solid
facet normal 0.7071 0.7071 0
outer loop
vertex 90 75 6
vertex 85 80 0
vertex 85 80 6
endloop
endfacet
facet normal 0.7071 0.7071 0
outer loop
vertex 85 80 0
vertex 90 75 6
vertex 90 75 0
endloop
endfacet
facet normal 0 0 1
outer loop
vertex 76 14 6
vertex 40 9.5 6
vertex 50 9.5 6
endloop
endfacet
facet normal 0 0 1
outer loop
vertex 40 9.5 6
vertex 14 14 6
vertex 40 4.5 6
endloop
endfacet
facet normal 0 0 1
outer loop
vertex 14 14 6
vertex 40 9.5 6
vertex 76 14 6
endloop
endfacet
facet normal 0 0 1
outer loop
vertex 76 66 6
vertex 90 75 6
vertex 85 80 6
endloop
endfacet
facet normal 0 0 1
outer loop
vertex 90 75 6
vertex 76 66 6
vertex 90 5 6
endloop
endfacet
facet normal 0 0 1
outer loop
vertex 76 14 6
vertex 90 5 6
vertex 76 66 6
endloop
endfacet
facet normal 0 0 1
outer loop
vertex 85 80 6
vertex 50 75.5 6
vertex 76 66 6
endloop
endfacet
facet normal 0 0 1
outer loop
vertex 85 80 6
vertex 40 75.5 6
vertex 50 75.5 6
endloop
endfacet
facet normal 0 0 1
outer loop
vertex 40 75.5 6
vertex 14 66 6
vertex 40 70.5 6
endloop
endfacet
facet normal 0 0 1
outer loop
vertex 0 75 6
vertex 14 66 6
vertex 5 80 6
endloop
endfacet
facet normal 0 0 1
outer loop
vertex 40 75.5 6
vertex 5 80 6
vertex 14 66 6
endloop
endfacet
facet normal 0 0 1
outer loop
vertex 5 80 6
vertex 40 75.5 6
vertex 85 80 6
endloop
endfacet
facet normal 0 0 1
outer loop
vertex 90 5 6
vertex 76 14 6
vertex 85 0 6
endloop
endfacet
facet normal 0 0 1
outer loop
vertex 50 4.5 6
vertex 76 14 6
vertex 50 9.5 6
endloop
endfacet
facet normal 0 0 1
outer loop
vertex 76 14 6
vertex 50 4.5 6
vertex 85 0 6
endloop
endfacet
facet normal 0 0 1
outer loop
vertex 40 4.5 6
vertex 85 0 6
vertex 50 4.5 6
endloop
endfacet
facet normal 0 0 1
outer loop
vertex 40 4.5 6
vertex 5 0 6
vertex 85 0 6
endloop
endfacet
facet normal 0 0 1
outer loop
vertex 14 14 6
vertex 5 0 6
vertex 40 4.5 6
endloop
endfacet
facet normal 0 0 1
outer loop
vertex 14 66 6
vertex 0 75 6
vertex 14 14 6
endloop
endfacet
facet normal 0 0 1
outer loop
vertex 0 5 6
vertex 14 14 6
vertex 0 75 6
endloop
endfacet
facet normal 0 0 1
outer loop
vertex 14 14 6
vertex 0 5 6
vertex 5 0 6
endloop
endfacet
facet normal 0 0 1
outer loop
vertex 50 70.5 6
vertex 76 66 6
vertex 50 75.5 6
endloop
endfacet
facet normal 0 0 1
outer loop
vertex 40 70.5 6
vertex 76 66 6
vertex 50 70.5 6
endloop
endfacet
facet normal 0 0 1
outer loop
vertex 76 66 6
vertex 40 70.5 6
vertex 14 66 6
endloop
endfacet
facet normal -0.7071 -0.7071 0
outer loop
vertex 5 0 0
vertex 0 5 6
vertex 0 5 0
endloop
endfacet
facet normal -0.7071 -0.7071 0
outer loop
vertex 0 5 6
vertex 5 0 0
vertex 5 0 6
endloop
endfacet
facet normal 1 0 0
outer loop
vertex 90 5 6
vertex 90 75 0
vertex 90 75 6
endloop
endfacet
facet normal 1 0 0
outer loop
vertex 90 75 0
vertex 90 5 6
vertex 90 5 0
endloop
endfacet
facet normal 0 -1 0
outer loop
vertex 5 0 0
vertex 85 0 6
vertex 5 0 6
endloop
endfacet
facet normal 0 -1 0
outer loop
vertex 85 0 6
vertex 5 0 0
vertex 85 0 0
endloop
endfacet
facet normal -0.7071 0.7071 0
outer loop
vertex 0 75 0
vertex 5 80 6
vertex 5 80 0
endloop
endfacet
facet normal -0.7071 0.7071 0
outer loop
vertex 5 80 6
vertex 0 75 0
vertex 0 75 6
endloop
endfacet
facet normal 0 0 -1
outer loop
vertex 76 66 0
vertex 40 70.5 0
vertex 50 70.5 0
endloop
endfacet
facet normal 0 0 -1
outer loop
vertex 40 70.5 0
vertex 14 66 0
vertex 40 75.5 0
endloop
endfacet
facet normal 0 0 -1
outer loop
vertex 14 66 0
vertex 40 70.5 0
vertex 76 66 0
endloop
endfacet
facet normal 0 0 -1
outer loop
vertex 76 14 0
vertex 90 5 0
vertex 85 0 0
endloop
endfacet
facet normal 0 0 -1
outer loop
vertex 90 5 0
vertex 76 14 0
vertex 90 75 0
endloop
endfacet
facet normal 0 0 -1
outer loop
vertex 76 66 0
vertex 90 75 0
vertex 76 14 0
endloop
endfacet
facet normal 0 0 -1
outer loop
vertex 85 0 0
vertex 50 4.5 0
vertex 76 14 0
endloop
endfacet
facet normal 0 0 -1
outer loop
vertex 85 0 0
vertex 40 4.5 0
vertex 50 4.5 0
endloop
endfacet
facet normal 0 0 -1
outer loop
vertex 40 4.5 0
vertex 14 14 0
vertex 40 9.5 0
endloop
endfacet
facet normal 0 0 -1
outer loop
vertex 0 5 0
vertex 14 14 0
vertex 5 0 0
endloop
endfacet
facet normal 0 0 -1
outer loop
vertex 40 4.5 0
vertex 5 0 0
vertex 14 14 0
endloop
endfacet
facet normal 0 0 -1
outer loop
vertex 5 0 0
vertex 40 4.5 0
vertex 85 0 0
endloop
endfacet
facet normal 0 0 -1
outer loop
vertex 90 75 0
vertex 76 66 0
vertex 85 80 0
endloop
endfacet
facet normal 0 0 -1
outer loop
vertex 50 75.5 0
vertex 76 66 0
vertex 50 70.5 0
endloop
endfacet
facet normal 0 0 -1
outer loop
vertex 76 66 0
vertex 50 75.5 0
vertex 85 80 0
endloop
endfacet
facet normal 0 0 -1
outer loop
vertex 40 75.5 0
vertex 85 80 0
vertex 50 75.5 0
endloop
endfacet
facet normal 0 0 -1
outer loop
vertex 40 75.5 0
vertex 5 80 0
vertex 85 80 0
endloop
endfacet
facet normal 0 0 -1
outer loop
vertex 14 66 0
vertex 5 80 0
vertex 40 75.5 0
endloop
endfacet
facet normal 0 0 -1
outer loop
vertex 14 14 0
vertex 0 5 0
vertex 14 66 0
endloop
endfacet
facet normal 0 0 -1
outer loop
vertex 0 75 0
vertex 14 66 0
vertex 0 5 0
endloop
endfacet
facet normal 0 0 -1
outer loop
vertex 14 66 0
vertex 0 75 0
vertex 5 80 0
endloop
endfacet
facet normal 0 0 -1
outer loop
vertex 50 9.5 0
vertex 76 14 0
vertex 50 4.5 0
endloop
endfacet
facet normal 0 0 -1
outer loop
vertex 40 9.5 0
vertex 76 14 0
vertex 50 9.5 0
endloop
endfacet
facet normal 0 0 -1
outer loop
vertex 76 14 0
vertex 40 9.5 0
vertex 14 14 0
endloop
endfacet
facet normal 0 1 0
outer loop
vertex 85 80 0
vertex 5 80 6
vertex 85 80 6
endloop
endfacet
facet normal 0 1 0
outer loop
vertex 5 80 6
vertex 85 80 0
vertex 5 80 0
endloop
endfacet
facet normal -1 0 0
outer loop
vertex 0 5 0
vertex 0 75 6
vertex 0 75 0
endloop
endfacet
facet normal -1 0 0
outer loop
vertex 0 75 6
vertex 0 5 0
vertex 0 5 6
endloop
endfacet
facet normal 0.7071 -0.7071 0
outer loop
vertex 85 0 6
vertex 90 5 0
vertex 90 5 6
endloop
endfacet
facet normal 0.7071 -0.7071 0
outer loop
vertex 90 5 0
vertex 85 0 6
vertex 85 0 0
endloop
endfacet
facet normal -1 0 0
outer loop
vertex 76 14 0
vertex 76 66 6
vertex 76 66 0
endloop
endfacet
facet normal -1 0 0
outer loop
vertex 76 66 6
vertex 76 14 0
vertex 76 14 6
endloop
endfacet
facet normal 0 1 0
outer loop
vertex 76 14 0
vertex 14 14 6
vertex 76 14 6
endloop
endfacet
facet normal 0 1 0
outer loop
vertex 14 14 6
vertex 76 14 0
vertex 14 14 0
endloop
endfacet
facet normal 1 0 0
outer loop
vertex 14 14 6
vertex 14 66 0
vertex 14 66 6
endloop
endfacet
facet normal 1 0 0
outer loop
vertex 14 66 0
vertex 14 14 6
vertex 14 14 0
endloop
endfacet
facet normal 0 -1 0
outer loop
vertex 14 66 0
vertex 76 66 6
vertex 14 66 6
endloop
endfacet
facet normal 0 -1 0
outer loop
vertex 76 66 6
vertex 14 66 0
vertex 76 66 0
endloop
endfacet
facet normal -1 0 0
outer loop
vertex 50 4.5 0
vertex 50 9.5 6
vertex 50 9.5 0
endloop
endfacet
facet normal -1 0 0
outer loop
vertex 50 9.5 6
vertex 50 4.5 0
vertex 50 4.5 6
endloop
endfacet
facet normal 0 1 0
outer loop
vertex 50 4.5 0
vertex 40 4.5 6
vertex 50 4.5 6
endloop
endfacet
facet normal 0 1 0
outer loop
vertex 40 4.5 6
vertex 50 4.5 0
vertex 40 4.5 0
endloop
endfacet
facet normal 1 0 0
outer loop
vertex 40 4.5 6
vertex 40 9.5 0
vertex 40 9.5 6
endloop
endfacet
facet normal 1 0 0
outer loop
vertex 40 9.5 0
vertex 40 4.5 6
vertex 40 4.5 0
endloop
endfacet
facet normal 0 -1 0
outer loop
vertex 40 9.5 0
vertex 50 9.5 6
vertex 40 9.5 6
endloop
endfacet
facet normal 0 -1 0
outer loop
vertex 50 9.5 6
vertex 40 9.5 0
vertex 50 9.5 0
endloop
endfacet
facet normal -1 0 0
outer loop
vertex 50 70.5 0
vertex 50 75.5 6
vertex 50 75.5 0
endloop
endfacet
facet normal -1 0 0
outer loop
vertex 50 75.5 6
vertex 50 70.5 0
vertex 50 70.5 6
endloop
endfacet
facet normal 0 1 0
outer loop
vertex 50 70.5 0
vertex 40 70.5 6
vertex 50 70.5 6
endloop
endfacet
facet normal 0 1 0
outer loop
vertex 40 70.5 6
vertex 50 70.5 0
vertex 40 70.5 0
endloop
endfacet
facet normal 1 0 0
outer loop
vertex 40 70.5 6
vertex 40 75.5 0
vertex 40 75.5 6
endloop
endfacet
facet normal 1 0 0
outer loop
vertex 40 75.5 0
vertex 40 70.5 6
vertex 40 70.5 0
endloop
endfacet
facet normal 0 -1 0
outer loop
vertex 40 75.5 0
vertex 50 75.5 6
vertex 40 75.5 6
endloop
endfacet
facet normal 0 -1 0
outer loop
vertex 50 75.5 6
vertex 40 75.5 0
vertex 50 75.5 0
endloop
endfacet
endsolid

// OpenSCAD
$fn = 32;

// ----------------------------------------------------------------------
// Frame plate: 90 x 80 frame, 14 mm rails
// ----------------------------------------------------------------------

// --- parameters (mm) ---
plate_l = 90;             // plate length, X
plate_w = 80;             // plate width, Y
plate_t = 6;              // plate thickness, Z (extrusion height)
corner_c = 5;             // corner chamfer
frame_bar = 14;           // frame rail width
slot_l = 10;              // adjustment slot length
slot_w = 5;               // adjustment slot width

win_l = plate_l - 2 * frame_bar;  // window length
win_w = plate_w - 2 * frame_bar;  // window width

profile = [[5, 0], [85, 0], [90, 5], [90, 75], [85, 80], [5, 80], [0, 75], [0, 5]];  // primary outline, 8 points, counter clockwise
void_1 = [[14, 14], [76, 14], [76, 66], [14, 66]];  // the window, 4 points
void_2 = [[40, 4.5], [50, 4.5], [50, 9.5], [40, 9.5]];  // adjustment slot, 4 points
void_3 = [[40, 70.5], [50, 70.5], [50, 75.5], [40, 75.5]];  // adjustment slot, 4 points

// --- the one profile operation ---
difference() {
  linear_extrude(height = plate_t) polygon(points = profile);
  translate([0, 0, -1])
    linear_extrude(height = plate_t + 2) polygon(points = void_1);
  translate([0, 0, -1])
    linear_extrude(height = plate_t + 2) polygon(points = void_2);
  translate([0, 0, -1])
    linear_extrude(height = plate_t + 2) polygon(points = void_3);
}
